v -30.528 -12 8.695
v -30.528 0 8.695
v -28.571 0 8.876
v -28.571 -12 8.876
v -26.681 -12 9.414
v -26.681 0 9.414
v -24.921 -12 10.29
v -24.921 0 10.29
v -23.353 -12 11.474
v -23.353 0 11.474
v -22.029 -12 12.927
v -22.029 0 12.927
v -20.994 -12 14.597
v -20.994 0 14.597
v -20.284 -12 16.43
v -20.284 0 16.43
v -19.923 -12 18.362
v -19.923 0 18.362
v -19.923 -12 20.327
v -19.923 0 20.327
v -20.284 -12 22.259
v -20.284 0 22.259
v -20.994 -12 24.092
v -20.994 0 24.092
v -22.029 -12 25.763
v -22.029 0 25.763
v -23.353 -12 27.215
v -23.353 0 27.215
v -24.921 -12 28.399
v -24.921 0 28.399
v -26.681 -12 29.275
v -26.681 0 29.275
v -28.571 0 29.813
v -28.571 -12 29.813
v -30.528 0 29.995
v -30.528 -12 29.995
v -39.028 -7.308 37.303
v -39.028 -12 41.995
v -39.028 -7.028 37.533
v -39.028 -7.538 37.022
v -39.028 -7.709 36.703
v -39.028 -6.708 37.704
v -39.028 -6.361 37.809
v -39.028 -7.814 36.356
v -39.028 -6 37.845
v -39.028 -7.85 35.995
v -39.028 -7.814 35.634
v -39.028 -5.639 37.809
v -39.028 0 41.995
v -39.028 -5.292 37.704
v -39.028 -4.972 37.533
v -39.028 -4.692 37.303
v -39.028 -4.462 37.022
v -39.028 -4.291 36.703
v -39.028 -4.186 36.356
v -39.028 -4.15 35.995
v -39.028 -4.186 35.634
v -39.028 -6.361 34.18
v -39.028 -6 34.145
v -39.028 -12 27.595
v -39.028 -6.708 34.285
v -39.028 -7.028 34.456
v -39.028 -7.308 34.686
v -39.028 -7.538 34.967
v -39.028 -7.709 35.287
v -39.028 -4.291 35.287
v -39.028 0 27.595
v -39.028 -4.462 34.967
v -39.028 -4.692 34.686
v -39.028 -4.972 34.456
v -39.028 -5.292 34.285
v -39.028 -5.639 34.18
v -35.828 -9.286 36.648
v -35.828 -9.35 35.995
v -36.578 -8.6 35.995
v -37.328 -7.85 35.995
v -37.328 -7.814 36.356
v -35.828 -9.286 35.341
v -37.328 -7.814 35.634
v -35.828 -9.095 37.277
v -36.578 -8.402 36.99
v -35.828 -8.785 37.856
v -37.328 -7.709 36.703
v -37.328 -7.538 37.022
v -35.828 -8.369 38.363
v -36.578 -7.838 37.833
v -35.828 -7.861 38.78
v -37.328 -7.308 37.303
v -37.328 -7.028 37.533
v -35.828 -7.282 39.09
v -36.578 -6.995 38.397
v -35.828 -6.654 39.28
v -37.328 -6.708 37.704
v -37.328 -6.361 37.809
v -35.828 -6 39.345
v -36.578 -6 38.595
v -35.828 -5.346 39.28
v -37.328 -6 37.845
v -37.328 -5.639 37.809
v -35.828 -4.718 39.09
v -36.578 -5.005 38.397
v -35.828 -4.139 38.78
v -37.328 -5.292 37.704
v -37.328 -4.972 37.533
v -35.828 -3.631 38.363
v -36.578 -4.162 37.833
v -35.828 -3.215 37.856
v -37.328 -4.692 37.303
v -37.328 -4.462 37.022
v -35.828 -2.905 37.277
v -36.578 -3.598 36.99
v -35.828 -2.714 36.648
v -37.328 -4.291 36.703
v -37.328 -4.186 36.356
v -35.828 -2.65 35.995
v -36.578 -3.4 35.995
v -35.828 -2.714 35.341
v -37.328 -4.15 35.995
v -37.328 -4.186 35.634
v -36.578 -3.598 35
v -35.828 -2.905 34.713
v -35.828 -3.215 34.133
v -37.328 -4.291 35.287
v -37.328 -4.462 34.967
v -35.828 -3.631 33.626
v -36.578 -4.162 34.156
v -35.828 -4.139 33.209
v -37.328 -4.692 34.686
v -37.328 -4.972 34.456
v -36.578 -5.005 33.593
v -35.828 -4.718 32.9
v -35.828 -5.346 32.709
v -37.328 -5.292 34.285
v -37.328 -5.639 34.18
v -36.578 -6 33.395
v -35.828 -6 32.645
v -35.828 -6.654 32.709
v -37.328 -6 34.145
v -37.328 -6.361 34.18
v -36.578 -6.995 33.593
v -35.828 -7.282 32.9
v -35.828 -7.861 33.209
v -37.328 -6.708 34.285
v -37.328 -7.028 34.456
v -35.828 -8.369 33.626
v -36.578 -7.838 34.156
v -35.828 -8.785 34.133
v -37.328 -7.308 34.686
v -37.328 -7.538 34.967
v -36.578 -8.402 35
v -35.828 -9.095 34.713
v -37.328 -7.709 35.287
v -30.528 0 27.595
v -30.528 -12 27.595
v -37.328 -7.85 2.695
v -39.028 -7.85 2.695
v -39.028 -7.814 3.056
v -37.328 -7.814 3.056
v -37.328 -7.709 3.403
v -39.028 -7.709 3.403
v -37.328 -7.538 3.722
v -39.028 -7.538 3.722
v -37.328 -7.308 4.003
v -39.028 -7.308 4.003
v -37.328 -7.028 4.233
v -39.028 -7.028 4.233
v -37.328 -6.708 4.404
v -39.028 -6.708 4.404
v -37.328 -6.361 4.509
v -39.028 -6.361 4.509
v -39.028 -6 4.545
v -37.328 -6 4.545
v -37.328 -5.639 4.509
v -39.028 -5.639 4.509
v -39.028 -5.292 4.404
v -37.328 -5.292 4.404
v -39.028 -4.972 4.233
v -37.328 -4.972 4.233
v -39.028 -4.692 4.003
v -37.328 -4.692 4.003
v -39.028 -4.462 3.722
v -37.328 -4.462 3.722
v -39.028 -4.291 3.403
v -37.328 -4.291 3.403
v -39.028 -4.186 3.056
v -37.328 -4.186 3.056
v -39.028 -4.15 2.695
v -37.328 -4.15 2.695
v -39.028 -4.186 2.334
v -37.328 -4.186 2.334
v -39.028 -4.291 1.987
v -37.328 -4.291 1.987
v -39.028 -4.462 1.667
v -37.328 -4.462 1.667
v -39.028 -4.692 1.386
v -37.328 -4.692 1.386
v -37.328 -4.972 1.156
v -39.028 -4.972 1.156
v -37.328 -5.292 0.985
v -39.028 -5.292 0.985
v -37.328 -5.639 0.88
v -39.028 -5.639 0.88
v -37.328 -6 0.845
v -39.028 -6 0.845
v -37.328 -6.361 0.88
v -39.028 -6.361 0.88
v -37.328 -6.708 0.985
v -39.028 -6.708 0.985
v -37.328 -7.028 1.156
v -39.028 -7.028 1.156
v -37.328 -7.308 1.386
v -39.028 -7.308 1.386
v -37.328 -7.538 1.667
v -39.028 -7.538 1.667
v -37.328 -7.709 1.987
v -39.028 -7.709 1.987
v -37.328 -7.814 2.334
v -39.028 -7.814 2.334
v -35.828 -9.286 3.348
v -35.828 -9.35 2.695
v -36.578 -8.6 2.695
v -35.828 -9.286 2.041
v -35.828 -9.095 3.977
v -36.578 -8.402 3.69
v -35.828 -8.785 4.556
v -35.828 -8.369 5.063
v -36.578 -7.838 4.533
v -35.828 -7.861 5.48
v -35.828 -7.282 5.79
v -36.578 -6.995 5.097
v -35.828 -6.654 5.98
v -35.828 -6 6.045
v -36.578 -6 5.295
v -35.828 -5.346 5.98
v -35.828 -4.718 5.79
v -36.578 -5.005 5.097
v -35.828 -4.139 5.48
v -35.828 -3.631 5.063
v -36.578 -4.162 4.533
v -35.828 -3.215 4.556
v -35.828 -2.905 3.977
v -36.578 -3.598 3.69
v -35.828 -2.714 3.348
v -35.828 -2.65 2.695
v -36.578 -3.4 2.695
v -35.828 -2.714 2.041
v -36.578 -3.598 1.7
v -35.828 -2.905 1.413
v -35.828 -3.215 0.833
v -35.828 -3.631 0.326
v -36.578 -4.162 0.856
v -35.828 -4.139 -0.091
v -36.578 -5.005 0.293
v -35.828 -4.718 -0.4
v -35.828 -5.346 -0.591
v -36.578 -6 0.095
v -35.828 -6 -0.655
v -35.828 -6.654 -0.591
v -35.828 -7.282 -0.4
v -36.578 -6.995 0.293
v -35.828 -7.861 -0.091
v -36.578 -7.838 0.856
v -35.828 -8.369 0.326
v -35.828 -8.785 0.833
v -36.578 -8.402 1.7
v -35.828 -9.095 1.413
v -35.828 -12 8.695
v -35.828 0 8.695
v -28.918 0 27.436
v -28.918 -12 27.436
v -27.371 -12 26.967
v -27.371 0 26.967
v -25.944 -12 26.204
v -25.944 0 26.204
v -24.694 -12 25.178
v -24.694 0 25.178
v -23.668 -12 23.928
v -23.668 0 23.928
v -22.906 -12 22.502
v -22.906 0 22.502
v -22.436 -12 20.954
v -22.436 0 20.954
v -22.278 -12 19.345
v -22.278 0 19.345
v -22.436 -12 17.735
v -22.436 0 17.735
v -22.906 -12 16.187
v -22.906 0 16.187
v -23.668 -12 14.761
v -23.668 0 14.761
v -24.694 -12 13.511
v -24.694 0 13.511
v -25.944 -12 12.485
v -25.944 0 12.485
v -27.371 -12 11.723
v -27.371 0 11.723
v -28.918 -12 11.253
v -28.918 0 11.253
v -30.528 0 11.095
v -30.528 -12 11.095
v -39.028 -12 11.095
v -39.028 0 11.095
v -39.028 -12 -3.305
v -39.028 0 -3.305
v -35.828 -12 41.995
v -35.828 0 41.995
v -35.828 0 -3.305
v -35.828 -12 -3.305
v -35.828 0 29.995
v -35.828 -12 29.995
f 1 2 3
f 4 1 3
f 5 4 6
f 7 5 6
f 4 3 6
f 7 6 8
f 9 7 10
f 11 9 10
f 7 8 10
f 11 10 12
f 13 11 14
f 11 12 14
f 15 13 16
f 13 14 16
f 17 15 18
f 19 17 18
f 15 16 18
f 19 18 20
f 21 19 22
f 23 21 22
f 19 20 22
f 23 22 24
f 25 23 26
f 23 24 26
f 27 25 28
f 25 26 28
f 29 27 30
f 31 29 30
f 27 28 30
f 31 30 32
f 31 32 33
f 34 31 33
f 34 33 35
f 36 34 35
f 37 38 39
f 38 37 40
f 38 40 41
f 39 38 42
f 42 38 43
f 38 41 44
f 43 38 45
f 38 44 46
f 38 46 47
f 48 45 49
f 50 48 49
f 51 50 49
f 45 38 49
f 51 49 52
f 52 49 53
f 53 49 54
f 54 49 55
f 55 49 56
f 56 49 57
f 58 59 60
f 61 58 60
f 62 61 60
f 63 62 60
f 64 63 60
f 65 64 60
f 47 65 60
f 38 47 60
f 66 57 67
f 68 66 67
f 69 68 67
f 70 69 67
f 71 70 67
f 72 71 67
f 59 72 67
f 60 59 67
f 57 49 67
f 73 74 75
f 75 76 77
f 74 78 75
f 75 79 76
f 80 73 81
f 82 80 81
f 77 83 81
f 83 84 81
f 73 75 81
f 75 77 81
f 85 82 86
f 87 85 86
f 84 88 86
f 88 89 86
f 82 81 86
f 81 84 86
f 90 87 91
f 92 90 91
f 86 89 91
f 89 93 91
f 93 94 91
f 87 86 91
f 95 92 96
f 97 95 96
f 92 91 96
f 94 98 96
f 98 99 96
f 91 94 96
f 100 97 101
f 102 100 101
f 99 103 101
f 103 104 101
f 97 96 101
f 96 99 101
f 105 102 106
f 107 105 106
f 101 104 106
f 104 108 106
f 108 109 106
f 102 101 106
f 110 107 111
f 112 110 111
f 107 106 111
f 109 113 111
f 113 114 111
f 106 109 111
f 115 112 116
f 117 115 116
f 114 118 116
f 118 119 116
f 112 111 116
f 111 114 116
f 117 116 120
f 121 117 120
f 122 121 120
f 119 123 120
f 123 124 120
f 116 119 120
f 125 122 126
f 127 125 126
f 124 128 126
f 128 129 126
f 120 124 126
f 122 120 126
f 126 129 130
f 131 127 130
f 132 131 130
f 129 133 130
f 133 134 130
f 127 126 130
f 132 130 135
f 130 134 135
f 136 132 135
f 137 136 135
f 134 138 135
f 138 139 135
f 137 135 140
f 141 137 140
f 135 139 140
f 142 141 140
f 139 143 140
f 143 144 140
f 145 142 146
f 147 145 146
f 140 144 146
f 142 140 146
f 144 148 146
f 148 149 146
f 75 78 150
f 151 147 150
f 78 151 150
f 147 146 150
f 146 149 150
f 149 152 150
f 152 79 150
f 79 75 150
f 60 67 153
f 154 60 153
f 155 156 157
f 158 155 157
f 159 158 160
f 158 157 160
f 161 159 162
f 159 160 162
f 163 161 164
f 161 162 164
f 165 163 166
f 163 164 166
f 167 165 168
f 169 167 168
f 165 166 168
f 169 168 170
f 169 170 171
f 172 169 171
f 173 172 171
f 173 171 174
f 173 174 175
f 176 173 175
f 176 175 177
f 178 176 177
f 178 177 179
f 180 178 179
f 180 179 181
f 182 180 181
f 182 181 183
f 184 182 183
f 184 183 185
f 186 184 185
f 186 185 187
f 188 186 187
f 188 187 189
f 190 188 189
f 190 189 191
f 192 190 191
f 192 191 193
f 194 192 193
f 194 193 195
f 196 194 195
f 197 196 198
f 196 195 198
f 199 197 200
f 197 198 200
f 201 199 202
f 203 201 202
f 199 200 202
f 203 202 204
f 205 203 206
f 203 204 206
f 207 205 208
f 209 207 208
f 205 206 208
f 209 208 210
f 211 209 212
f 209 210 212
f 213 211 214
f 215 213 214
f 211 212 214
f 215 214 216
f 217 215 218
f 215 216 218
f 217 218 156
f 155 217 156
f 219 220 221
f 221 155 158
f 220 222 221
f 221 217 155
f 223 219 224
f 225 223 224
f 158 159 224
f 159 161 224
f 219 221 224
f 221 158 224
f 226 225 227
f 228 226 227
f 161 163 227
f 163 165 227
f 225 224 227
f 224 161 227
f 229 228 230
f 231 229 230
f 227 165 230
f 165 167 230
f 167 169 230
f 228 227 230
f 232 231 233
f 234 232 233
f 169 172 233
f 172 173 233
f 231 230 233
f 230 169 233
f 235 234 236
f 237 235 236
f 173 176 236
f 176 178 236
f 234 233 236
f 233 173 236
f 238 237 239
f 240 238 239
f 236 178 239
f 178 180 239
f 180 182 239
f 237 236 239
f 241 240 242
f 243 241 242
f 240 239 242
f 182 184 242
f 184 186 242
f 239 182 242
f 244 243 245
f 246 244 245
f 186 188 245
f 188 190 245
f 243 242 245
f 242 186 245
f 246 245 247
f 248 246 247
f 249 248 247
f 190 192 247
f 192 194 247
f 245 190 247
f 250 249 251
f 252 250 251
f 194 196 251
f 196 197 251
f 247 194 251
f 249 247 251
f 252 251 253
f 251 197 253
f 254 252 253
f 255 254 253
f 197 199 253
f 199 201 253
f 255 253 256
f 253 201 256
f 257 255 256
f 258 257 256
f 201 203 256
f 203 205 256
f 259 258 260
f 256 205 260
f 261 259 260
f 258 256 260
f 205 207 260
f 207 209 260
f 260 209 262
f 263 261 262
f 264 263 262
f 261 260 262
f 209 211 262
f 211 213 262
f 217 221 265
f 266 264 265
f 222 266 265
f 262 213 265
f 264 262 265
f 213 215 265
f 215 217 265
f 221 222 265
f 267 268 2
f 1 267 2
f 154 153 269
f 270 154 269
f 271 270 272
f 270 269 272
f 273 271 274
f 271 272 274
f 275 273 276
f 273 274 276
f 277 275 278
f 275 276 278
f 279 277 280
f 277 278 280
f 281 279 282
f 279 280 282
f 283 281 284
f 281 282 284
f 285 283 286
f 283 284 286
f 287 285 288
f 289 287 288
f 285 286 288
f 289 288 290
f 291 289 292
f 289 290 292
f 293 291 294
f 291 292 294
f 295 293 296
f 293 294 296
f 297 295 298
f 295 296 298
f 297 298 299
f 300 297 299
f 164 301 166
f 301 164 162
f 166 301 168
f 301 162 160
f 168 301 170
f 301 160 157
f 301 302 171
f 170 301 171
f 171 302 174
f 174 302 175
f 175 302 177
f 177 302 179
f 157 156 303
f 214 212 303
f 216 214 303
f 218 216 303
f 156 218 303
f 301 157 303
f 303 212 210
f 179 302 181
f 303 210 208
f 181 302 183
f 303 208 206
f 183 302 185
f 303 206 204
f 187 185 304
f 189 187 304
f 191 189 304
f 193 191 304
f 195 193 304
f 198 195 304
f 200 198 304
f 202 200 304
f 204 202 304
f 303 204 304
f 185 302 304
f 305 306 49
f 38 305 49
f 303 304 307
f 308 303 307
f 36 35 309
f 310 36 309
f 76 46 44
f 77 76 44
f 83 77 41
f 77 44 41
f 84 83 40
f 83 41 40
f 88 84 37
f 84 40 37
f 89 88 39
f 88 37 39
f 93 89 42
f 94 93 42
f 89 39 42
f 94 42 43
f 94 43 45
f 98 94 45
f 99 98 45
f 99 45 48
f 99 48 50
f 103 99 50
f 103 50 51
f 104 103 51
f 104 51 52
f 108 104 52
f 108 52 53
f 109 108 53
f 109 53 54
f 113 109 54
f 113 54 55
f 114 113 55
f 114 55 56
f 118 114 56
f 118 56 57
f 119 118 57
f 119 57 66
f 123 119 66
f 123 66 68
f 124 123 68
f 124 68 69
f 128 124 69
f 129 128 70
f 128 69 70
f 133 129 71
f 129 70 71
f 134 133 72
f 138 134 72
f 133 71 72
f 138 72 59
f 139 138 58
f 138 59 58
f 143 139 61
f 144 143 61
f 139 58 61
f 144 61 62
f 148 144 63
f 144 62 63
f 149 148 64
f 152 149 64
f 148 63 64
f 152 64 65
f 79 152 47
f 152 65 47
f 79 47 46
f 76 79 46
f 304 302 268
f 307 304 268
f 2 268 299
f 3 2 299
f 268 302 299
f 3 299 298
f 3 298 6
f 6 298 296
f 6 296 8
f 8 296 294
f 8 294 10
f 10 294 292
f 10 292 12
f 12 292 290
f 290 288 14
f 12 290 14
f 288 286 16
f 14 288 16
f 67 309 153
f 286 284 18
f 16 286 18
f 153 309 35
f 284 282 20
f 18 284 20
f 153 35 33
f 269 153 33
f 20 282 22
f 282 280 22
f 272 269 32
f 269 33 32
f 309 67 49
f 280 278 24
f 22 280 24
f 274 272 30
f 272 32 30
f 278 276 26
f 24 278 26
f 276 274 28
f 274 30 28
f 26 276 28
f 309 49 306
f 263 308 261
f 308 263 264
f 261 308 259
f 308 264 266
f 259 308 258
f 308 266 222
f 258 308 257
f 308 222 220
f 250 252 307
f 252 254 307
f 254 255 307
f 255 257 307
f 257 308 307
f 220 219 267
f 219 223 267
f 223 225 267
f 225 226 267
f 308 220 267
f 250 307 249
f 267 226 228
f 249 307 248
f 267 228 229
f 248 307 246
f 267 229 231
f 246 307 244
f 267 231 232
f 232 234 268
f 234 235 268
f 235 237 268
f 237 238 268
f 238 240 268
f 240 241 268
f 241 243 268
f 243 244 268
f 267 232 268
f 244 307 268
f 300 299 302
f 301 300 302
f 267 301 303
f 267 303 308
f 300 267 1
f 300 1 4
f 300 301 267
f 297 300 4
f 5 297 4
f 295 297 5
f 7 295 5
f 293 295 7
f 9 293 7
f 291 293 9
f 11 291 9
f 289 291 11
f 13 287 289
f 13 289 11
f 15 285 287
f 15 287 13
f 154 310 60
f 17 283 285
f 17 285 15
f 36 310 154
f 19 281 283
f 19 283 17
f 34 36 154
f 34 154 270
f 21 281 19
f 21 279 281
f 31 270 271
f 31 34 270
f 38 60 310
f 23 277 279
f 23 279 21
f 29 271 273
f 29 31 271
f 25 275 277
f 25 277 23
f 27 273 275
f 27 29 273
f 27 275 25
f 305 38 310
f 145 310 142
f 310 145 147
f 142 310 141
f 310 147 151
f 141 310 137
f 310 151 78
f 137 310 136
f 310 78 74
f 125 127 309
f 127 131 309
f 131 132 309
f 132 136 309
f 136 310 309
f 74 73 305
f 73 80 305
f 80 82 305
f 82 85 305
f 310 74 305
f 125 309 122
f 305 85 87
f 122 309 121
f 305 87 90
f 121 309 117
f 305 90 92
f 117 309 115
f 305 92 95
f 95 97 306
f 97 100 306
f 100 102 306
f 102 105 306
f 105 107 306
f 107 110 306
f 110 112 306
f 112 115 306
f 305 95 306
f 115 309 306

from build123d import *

# Parameters (mm, degrees)
F1_DEPTH = 12
F2_R     = 1.85
F3_DEPTH = 19.151
F4_SIZE  = 1.5


with BuildPart() as f1:
    # F0 (on Front) → F1 (new body)
    with BuildSketch(Plane.XZ):
        with BuildLine():
            Line((-35.8277369916, 41.9945976296), (-39.0277369916, 41.9945976296))
            Line((-39.0277369916, 41.9945976296), (-39.0277369916, 27.5945976296))
            Line((-39.0277369916, 27.5945976296), (-30.5277369916, 27.5945976296))
            ThreePointArc((-30.5277369916, 27.5945976296), (-22.2777369916, 19.3445976296), (-30.5277369916, 11.0945976296))
            Line((-30.5277369916, 11.0945976296), (-39.0277369916, 11.0945976296))
            Line((-39.0277369916, 11.0945976296), (-39.0277369916, -3.3054023704))
            Line((-39.0277369916, -3.3054023704), (-35.8277369916, -3.3054023704))
            Line((-35.8277369916, -3.3054023704), (-35.8277369916, 8.6945976296))
            Line((-35.8277369916, 8.6945976296), (-30.5277369916, 8.6945976296))
            ThreePointArc((-30.5277369916, 8.6945976296), (-19.8777369916, 19.3445976296), (-30.5277369916, 29.9945976296))
            Line((-30.5277369916, 29.9945976296), (-35.8277369916, 29.9945976296))
            Line((-35.8277369916, 29.9945976296), (-35.8277369916, 41.9945976296))
        make_face()
    extrude(amount=F1_DEPTH)

    # F2 (on face) → F3 (cut, through all)
    with BuildSketch(Plane(origin=(-39.0277369916, 0, 0), x_dir=(0, -1, 0), z_dir=(-1, 0, 0))):
        with Locations((6, 35.9945976296)):
            Circle(F2_R)
        with Locations((6, 2.6945976296)):
            Circle(F2_R)
    extrude(amount=-F3_DEPTH, mode=Mode.SUBTRACT)

    # F4
    f4_edges = [f1.edges().sort_by_distance(p)[0] for p in [
        (-35.827737, -4.15, 35.994598),
        (-35.827737, -4.15, 2.694598),
    ]]
    chamfer(f4_edges, length=F4_SIZE)


solid = f1.part
